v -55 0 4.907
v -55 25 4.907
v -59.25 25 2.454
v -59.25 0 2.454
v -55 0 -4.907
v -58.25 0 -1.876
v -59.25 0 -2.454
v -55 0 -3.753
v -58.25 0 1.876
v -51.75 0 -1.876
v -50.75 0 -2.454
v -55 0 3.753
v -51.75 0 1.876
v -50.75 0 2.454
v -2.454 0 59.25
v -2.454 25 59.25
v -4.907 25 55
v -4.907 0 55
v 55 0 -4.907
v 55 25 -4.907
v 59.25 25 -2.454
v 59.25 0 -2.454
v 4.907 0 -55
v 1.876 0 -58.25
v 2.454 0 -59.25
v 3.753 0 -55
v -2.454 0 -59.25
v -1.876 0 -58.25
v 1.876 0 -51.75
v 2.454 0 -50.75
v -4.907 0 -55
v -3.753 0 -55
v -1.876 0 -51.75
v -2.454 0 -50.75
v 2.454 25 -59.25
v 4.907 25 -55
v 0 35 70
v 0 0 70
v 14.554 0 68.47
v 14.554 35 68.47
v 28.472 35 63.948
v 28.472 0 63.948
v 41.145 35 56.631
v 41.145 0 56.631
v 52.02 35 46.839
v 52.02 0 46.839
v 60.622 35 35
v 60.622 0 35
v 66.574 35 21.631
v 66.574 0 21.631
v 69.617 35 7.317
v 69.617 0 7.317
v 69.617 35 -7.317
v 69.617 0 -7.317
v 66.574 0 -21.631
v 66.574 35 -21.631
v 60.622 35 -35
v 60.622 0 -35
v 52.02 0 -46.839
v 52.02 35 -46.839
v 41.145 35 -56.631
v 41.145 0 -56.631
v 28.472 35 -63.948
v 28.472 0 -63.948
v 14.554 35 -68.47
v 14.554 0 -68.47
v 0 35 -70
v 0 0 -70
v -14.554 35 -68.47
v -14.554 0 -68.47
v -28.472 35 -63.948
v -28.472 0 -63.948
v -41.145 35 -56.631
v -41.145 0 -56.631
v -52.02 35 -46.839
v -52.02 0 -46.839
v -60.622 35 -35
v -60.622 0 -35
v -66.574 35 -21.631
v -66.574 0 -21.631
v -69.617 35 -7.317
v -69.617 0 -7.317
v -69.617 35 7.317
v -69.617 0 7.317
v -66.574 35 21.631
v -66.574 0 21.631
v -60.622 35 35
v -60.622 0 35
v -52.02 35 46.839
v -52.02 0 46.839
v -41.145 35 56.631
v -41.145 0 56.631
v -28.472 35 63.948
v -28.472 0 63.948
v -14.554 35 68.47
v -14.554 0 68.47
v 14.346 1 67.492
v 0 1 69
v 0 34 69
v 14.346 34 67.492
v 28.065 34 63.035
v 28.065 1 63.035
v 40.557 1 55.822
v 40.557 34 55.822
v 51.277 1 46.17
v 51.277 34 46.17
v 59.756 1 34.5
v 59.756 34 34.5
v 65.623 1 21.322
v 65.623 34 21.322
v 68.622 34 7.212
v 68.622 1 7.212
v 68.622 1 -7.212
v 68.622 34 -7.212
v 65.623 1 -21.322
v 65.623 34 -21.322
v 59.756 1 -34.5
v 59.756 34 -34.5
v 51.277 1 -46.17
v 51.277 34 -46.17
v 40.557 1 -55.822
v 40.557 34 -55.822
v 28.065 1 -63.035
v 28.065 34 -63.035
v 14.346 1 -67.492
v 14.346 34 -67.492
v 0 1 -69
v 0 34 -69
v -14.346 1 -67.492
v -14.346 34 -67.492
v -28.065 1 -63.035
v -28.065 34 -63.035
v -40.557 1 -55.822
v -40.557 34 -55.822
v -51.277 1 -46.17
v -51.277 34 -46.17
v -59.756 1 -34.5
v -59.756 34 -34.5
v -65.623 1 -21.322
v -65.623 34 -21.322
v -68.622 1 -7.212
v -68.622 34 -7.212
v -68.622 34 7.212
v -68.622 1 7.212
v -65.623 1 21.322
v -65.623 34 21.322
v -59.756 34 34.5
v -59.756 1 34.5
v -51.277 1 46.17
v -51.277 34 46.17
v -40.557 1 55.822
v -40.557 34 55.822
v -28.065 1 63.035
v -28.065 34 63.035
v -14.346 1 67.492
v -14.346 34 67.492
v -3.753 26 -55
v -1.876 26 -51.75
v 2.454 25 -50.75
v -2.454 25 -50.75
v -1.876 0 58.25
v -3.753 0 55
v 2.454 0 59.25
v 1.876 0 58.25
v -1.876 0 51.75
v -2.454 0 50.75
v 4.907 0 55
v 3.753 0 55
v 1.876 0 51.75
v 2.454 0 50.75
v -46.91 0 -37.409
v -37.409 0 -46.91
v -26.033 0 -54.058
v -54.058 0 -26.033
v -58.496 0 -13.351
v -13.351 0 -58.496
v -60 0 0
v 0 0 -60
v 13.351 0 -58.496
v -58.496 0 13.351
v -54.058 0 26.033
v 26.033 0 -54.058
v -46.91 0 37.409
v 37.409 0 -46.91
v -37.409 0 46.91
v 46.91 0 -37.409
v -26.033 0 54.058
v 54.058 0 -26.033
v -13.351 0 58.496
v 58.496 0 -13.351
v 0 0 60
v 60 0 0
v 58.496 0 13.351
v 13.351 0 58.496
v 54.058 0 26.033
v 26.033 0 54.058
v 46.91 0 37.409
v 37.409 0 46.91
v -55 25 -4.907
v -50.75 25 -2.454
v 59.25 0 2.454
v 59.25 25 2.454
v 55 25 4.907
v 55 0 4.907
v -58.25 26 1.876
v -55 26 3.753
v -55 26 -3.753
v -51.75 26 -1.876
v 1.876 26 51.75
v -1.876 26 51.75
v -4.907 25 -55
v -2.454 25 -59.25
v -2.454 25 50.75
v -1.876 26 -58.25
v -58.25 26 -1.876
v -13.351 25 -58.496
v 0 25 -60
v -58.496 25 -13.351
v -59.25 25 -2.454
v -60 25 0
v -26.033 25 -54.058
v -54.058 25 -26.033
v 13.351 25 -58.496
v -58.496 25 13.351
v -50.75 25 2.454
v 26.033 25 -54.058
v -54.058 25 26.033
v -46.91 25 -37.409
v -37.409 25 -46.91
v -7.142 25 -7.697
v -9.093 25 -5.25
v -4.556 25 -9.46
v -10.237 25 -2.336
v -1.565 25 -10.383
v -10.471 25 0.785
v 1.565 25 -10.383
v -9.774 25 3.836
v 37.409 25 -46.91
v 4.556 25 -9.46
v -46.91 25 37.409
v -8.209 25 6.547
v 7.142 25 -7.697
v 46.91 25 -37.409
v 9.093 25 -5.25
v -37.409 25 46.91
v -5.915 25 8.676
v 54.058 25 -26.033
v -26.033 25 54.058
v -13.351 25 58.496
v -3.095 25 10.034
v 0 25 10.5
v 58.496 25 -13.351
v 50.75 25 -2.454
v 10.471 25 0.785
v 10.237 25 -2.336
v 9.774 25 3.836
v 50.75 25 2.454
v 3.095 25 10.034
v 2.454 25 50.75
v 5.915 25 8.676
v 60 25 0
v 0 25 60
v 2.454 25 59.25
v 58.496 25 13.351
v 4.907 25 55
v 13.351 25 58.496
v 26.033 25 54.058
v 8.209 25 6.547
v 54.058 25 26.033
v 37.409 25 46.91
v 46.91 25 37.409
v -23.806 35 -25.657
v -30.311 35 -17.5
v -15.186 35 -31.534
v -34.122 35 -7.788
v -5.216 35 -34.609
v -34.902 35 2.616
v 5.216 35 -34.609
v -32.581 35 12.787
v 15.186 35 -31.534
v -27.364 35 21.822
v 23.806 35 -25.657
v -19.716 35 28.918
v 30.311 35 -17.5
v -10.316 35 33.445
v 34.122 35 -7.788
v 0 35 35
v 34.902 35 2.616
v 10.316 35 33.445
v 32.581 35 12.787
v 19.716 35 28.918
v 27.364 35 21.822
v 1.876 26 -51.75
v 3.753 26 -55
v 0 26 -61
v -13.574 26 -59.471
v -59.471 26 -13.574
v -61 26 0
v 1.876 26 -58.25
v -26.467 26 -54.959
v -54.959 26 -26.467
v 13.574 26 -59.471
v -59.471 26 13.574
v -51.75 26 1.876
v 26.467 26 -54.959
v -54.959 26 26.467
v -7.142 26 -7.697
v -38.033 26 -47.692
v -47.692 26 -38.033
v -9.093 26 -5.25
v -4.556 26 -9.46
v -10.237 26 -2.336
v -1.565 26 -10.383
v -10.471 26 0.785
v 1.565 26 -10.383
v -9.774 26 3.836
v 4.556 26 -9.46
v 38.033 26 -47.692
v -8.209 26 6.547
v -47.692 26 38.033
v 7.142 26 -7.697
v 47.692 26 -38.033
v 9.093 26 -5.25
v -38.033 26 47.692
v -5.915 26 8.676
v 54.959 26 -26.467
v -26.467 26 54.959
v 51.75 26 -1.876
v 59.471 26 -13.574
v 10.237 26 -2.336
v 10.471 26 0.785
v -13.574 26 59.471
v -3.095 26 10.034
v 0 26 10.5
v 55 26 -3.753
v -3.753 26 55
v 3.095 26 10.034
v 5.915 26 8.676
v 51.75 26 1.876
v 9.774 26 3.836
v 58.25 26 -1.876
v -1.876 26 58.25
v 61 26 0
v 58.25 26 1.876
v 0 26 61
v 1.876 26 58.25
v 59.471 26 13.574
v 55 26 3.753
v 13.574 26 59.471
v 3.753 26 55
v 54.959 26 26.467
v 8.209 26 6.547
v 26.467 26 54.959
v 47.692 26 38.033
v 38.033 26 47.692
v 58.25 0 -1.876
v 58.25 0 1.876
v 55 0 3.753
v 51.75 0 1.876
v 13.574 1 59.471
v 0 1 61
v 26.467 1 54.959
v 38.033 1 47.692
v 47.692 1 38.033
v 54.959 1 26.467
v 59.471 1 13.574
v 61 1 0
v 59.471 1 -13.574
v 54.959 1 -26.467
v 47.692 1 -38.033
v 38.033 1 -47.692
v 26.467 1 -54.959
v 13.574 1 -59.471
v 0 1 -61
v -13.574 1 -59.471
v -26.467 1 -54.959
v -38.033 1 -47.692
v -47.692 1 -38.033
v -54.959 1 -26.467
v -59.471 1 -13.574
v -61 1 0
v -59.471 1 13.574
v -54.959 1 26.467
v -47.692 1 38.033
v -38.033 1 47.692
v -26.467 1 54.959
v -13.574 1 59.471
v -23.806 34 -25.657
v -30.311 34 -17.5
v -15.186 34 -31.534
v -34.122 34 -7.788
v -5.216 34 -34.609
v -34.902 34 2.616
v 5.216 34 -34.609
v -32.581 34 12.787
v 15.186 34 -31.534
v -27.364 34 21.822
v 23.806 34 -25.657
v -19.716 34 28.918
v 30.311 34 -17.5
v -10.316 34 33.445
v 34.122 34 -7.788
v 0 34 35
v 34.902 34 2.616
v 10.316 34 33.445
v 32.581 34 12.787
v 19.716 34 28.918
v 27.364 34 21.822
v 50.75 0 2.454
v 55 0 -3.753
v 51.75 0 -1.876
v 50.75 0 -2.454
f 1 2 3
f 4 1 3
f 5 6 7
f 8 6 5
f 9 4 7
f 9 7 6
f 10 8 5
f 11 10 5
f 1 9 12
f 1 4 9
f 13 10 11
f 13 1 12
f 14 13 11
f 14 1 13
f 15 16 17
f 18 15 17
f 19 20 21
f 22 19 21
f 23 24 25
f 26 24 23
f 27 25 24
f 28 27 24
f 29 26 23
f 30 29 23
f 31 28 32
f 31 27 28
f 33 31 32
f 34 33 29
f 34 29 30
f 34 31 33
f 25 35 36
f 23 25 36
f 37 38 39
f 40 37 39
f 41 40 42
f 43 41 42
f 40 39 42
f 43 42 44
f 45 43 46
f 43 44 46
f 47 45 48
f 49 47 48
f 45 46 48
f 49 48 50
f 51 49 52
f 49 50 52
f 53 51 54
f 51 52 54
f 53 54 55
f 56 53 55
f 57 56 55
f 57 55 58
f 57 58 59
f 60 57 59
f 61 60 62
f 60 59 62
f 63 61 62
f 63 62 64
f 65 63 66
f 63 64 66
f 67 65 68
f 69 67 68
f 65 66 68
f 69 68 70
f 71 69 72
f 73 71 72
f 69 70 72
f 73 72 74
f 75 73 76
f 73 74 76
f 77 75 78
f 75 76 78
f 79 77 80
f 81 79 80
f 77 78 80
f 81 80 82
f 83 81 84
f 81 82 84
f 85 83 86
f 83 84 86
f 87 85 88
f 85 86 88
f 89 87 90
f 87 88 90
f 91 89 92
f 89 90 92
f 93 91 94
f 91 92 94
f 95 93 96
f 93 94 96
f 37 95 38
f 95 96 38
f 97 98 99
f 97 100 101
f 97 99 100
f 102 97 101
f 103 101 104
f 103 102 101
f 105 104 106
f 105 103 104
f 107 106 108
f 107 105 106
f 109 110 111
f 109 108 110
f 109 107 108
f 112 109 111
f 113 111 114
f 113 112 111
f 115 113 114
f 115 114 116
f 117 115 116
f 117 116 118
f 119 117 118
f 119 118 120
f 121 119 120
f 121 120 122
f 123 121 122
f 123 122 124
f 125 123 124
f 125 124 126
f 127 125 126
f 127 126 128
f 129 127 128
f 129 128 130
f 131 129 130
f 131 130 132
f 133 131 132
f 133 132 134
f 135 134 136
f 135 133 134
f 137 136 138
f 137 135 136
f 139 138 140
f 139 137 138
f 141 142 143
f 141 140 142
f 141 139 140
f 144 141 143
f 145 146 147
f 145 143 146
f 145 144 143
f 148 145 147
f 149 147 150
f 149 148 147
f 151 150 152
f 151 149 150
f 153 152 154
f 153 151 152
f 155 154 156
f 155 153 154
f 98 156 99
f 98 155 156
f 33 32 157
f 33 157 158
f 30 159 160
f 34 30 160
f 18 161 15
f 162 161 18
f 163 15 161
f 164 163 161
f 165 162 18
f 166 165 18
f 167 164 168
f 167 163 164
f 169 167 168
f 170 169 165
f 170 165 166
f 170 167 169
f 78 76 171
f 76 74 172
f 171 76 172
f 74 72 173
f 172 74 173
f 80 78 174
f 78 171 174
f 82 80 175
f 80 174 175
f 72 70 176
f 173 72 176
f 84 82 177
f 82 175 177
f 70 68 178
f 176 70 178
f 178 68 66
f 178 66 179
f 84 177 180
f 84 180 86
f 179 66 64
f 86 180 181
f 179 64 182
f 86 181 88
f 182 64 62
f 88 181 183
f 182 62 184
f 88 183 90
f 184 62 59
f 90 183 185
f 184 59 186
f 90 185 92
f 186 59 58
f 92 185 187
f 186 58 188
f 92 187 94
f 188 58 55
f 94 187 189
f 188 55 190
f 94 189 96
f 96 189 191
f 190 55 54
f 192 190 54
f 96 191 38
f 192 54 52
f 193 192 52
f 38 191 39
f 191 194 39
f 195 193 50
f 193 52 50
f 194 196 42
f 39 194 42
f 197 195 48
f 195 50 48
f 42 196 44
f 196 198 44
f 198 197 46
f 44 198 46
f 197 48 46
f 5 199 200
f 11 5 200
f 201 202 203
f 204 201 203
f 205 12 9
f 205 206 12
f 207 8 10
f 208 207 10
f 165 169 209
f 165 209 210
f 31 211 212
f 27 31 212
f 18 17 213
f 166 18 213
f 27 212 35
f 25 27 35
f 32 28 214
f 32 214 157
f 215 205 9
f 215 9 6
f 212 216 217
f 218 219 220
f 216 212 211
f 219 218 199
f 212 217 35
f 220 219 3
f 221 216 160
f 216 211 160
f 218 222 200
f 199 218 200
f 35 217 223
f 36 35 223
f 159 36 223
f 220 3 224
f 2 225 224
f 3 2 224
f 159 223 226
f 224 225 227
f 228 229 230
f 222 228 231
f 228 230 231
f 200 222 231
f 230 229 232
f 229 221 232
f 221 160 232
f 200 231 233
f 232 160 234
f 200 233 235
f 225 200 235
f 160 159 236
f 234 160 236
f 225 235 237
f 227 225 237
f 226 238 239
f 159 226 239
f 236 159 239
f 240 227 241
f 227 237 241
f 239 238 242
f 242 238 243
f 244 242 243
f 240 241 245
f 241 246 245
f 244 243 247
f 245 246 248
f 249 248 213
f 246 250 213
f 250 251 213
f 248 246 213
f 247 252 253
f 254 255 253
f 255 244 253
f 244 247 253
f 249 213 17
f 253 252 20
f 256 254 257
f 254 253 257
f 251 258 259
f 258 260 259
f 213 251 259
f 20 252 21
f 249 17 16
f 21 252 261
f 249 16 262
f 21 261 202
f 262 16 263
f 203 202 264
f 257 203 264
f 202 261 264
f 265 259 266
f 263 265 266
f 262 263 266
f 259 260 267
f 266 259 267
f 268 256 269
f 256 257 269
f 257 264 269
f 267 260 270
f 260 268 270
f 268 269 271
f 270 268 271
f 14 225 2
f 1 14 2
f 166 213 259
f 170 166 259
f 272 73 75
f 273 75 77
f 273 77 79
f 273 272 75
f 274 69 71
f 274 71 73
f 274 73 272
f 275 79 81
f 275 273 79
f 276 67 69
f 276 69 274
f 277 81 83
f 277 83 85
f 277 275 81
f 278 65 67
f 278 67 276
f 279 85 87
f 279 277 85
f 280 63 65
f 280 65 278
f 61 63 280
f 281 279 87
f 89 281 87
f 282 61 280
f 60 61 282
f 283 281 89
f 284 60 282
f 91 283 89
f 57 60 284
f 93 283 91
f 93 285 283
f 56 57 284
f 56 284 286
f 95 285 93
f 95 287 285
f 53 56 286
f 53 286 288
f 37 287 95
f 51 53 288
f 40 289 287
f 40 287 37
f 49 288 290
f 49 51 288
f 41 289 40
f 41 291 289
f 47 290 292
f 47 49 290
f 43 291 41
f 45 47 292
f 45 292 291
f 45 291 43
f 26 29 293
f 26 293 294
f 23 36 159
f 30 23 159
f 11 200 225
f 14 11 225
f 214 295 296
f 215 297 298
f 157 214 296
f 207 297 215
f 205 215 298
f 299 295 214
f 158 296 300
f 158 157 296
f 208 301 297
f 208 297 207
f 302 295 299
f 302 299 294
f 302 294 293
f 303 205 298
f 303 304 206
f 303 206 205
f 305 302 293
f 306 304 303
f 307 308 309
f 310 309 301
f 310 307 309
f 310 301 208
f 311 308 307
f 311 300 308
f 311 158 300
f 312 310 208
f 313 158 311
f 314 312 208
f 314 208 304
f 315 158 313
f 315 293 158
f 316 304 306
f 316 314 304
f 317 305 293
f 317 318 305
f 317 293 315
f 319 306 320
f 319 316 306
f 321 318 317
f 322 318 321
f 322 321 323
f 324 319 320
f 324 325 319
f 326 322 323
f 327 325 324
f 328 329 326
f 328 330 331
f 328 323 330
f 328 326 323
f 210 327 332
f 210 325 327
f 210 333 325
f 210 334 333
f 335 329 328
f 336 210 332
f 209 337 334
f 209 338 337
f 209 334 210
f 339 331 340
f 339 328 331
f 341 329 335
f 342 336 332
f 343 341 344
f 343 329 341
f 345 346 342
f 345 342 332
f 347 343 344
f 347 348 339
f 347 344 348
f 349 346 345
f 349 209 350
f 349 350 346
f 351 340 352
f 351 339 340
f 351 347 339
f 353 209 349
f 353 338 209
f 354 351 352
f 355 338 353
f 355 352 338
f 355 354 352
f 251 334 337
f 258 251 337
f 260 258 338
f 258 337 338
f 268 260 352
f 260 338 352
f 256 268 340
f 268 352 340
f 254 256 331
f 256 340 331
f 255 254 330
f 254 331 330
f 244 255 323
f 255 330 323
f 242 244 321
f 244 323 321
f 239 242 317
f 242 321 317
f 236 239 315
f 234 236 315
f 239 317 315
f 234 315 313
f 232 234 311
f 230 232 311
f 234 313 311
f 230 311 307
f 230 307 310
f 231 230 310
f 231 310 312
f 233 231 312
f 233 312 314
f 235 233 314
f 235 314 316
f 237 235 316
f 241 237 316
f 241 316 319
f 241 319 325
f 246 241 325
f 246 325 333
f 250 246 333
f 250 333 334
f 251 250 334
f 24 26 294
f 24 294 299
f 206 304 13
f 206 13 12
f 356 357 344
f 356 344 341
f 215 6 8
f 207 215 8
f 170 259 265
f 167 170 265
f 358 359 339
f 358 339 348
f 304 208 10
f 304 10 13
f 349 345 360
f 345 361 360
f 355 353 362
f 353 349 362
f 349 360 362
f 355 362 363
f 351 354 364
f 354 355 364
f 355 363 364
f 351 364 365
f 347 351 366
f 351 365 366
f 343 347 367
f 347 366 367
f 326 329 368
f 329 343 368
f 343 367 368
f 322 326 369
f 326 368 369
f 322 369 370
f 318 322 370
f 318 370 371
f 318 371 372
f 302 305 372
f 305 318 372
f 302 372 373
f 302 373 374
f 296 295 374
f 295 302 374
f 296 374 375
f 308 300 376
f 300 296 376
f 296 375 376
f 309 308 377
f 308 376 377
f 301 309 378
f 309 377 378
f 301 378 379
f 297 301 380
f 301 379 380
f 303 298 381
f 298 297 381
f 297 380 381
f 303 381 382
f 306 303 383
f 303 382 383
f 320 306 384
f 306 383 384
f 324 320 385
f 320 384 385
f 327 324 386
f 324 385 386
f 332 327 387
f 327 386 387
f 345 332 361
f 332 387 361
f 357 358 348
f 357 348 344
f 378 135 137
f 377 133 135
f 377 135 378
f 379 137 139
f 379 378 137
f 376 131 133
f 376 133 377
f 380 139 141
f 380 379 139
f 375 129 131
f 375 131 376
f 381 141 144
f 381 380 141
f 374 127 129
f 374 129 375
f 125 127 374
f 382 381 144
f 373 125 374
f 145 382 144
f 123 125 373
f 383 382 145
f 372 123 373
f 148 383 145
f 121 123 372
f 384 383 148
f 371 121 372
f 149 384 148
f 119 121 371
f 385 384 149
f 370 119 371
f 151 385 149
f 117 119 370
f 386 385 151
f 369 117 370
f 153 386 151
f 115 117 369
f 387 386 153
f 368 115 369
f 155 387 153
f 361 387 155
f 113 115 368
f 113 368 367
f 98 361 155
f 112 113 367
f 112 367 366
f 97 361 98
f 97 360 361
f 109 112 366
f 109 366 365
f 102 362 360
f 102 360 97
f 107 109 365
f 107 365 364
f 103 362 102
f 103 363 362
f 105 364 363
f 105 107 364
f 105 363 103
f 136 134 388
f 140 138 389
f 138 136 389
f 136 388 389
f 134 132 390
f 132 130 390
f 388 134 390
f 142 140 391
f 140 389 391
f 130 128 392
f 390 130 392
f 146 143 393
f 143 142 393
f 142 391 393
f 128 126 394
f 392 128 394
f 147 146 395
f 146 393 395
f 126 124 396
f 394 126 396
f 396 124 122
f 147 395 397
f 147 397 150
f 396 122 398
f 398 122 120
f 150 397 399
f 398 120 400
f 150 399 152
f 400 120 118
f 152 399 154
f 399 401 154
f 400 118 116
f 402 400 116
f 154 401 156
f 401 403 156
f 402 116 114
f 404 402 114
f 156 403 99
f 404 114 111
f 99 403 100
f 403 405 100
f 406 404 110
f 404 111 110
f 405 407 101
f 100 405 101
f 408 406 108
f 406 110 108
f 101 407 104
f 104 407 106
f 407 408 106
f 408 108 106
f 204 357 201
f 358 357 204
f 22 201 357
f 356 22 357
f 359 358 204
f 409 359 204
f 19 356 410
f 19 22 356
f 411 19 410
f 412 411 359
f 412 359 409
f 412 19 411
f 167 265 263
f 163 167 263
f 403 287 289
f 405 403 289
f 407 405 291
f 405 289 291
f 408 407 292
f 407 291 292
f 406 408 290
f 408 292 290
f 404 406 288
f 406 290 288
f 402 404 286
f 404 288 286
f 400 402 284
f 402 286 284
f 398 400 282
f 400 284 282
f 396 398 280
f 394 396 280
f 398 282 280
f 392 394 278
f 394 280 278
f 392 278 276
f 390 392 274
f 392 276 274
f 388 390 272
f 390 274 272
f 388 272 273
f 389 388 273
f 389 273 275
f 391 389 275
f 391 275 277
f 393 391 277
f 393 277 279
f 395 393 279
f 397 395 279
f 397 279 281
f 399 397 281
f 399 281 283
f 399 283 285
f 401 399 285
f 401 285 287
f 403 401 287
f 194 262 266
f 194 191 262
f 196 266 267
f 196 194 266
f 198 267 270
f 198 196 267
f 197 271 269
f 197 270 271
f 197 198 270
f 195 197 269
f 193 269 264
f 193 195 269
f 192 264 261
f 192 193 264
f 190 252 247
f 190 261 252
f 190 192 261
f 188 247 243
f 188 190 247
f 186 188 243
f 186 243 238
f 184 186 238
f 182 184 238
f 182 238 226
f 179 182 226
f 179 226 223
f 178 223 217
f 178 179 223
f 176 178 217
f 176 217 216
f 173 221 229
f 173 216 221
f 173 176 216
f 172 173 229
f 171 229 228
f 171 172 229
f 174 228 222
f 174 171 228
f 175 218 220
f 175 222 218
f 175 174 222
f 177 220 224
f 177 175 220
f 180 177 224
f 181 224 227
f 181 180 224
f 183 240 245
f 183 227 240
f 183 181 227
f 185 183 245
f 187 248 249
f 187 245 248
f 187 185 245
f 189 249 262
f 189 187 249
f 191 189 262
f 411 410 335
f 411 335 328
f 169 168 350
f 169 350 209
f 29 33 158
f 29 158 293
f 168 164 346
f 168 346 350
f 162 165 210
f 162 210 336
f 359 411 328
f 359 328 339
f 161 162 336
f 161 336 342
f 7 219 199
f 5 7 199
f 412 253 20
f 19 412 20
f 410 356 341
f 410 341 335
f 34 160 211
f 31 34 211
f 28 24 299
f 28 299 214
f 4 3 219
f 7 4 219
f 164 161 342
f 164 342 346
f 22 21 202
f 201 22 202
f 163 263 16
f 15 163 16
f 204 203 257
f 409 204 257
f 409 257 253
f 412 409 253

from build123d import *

# Parameters (mm, degrees)
SKETCH1_R           = 70
BOSS_EXTRUDE1_DEPTH = 35
SHELL6_T            = -10
BOSS_EXTRUDE3_DEPTH = 25
SHELL13_T           = -1
CIRPATTERN6_COUNT   = 4
CIRPATTERN7_DEPTH   = 26
SKETCH2_R           = 35
CUT_EXTRUDE5_DEPTH  = 7
SKETCH6_R           = 10.5
CUT_EXTRUDE6_DEPTH  = 7


# Read off the part's stored shape, not the designer's step: CirPattern7
with BuildPart() as part:
    # Sketch1 → Boss-Extrude1 (new body)
    with BuildSketch(Plane(origin=(0, 0, 0), x_dir=(1, 0, 0), z_dir=(0, 1, 0))):
        with Locations(Location((0, 0, 0), (0, 0, 270))):
            Circle(SKETCH1_R)
    extrude(amount=BOSS_EXTRUDE1_DEPTH)

    # Shell6
    shell6_openings = [part.faces().sort_by_distance(p)[0] for p in [
        (0, 0, 0),
    ]]
    offset(amount=SHELL6_T, openings=shell6_openings, kind=Kind.INTERSECTION)

    # Sketch5 → Boss-Extrude3 (add, through all)
    with BuildSketch(Plane.XZ.offset(-25)):
        Polygon((-55, 4.907477288), (-59.25, 2.453738644), (-59.25, -2.453738644), (-55, -4.907477288), (-50.75, -2.453738644), (-50.75, 2.453738644), align=None)
    boss_extrude3 = extrude(amount=BOSS_EXTRUDE3_DEPTH)

    # Shell13
    shell13_openings = [part.faces().sort_by_distance(p)[0] for p in [
        (-55, 0, 0),
    ]]
    offset(amount=SHELL13_T, openings=shell13_openings, kind=Kind.INTERSECTION)

    # CirPattern6: Boss-Extrude3 ×4 about axis
    cirpattern6_axis = Axis((0, 0, 0), (0, 1, 0))
    for i in range(1, CIRPATTERN6_COUNT):
        add(boss_extrude3.rotate(cirpattern6_axis, i * 360 / CIRPATTERN6_COUNT))

    # CirPattern7 outline → CirPattern7 (cut)
    with BuildSketch(Plane(origin=(0, 0, 0), x_dir=(1, 0, 0), z_dir=(0, 1, 0))):
        Polygon((-1.876388375, 51.75), (1.876388375, 51.75), (3.75277675, 55), (1.876388375, 58.25), (-1.876388375, 58.25), (-3.75277675, 55), align=None)
        Polygon((51.75, -1.876388375), (55, -3.75277675), (58.25, -1.876388375), (58.25, 1.876388375), (55, 3.75277675), (51.75, 1.876388375), align=None)
        Polygon((1.876388375, -51.75), (-1.876388375, -51.75), (-3.75277675, -55), (-1.876388375, -58.25), (1.876388375, -58.25), (3.75277675, -55), align=None)
    extrude(amount=CIRPATTERN7_DEPTH, mode=Mode.SUBTRACT)

    # Sketch2 → Cut-Extrude5 (cut)
    with BuildSketch(Plane(origin=(0, 35, 0), x_dir=(1, 0, 0), z_dir=(0, 1, 0))):
        with Locations(Location((0, 0, 0), (0, 0, 270))):
            Circle(SKETCH2_R)
    extrude(amount=-CUT_EXTRUDE5_DEPTH, mode=Mode.SUBTRACT)

    # Sketch6 → Cut-Extrude6 (cut)
    with BuildSketch(Plane(origin=(0, 26, 0), x_dir=(1, 0, 0), z_dir=(0, 1, 0))):
        with Locations(Location((0, 0, 0), (0, 0, 270))):
            Circle(SKETCH6_R)
    extrude(amount=-CUT_EXTRUDE6_DEPTH, mode=Mode.SUBTRACT)


solid = part.part
